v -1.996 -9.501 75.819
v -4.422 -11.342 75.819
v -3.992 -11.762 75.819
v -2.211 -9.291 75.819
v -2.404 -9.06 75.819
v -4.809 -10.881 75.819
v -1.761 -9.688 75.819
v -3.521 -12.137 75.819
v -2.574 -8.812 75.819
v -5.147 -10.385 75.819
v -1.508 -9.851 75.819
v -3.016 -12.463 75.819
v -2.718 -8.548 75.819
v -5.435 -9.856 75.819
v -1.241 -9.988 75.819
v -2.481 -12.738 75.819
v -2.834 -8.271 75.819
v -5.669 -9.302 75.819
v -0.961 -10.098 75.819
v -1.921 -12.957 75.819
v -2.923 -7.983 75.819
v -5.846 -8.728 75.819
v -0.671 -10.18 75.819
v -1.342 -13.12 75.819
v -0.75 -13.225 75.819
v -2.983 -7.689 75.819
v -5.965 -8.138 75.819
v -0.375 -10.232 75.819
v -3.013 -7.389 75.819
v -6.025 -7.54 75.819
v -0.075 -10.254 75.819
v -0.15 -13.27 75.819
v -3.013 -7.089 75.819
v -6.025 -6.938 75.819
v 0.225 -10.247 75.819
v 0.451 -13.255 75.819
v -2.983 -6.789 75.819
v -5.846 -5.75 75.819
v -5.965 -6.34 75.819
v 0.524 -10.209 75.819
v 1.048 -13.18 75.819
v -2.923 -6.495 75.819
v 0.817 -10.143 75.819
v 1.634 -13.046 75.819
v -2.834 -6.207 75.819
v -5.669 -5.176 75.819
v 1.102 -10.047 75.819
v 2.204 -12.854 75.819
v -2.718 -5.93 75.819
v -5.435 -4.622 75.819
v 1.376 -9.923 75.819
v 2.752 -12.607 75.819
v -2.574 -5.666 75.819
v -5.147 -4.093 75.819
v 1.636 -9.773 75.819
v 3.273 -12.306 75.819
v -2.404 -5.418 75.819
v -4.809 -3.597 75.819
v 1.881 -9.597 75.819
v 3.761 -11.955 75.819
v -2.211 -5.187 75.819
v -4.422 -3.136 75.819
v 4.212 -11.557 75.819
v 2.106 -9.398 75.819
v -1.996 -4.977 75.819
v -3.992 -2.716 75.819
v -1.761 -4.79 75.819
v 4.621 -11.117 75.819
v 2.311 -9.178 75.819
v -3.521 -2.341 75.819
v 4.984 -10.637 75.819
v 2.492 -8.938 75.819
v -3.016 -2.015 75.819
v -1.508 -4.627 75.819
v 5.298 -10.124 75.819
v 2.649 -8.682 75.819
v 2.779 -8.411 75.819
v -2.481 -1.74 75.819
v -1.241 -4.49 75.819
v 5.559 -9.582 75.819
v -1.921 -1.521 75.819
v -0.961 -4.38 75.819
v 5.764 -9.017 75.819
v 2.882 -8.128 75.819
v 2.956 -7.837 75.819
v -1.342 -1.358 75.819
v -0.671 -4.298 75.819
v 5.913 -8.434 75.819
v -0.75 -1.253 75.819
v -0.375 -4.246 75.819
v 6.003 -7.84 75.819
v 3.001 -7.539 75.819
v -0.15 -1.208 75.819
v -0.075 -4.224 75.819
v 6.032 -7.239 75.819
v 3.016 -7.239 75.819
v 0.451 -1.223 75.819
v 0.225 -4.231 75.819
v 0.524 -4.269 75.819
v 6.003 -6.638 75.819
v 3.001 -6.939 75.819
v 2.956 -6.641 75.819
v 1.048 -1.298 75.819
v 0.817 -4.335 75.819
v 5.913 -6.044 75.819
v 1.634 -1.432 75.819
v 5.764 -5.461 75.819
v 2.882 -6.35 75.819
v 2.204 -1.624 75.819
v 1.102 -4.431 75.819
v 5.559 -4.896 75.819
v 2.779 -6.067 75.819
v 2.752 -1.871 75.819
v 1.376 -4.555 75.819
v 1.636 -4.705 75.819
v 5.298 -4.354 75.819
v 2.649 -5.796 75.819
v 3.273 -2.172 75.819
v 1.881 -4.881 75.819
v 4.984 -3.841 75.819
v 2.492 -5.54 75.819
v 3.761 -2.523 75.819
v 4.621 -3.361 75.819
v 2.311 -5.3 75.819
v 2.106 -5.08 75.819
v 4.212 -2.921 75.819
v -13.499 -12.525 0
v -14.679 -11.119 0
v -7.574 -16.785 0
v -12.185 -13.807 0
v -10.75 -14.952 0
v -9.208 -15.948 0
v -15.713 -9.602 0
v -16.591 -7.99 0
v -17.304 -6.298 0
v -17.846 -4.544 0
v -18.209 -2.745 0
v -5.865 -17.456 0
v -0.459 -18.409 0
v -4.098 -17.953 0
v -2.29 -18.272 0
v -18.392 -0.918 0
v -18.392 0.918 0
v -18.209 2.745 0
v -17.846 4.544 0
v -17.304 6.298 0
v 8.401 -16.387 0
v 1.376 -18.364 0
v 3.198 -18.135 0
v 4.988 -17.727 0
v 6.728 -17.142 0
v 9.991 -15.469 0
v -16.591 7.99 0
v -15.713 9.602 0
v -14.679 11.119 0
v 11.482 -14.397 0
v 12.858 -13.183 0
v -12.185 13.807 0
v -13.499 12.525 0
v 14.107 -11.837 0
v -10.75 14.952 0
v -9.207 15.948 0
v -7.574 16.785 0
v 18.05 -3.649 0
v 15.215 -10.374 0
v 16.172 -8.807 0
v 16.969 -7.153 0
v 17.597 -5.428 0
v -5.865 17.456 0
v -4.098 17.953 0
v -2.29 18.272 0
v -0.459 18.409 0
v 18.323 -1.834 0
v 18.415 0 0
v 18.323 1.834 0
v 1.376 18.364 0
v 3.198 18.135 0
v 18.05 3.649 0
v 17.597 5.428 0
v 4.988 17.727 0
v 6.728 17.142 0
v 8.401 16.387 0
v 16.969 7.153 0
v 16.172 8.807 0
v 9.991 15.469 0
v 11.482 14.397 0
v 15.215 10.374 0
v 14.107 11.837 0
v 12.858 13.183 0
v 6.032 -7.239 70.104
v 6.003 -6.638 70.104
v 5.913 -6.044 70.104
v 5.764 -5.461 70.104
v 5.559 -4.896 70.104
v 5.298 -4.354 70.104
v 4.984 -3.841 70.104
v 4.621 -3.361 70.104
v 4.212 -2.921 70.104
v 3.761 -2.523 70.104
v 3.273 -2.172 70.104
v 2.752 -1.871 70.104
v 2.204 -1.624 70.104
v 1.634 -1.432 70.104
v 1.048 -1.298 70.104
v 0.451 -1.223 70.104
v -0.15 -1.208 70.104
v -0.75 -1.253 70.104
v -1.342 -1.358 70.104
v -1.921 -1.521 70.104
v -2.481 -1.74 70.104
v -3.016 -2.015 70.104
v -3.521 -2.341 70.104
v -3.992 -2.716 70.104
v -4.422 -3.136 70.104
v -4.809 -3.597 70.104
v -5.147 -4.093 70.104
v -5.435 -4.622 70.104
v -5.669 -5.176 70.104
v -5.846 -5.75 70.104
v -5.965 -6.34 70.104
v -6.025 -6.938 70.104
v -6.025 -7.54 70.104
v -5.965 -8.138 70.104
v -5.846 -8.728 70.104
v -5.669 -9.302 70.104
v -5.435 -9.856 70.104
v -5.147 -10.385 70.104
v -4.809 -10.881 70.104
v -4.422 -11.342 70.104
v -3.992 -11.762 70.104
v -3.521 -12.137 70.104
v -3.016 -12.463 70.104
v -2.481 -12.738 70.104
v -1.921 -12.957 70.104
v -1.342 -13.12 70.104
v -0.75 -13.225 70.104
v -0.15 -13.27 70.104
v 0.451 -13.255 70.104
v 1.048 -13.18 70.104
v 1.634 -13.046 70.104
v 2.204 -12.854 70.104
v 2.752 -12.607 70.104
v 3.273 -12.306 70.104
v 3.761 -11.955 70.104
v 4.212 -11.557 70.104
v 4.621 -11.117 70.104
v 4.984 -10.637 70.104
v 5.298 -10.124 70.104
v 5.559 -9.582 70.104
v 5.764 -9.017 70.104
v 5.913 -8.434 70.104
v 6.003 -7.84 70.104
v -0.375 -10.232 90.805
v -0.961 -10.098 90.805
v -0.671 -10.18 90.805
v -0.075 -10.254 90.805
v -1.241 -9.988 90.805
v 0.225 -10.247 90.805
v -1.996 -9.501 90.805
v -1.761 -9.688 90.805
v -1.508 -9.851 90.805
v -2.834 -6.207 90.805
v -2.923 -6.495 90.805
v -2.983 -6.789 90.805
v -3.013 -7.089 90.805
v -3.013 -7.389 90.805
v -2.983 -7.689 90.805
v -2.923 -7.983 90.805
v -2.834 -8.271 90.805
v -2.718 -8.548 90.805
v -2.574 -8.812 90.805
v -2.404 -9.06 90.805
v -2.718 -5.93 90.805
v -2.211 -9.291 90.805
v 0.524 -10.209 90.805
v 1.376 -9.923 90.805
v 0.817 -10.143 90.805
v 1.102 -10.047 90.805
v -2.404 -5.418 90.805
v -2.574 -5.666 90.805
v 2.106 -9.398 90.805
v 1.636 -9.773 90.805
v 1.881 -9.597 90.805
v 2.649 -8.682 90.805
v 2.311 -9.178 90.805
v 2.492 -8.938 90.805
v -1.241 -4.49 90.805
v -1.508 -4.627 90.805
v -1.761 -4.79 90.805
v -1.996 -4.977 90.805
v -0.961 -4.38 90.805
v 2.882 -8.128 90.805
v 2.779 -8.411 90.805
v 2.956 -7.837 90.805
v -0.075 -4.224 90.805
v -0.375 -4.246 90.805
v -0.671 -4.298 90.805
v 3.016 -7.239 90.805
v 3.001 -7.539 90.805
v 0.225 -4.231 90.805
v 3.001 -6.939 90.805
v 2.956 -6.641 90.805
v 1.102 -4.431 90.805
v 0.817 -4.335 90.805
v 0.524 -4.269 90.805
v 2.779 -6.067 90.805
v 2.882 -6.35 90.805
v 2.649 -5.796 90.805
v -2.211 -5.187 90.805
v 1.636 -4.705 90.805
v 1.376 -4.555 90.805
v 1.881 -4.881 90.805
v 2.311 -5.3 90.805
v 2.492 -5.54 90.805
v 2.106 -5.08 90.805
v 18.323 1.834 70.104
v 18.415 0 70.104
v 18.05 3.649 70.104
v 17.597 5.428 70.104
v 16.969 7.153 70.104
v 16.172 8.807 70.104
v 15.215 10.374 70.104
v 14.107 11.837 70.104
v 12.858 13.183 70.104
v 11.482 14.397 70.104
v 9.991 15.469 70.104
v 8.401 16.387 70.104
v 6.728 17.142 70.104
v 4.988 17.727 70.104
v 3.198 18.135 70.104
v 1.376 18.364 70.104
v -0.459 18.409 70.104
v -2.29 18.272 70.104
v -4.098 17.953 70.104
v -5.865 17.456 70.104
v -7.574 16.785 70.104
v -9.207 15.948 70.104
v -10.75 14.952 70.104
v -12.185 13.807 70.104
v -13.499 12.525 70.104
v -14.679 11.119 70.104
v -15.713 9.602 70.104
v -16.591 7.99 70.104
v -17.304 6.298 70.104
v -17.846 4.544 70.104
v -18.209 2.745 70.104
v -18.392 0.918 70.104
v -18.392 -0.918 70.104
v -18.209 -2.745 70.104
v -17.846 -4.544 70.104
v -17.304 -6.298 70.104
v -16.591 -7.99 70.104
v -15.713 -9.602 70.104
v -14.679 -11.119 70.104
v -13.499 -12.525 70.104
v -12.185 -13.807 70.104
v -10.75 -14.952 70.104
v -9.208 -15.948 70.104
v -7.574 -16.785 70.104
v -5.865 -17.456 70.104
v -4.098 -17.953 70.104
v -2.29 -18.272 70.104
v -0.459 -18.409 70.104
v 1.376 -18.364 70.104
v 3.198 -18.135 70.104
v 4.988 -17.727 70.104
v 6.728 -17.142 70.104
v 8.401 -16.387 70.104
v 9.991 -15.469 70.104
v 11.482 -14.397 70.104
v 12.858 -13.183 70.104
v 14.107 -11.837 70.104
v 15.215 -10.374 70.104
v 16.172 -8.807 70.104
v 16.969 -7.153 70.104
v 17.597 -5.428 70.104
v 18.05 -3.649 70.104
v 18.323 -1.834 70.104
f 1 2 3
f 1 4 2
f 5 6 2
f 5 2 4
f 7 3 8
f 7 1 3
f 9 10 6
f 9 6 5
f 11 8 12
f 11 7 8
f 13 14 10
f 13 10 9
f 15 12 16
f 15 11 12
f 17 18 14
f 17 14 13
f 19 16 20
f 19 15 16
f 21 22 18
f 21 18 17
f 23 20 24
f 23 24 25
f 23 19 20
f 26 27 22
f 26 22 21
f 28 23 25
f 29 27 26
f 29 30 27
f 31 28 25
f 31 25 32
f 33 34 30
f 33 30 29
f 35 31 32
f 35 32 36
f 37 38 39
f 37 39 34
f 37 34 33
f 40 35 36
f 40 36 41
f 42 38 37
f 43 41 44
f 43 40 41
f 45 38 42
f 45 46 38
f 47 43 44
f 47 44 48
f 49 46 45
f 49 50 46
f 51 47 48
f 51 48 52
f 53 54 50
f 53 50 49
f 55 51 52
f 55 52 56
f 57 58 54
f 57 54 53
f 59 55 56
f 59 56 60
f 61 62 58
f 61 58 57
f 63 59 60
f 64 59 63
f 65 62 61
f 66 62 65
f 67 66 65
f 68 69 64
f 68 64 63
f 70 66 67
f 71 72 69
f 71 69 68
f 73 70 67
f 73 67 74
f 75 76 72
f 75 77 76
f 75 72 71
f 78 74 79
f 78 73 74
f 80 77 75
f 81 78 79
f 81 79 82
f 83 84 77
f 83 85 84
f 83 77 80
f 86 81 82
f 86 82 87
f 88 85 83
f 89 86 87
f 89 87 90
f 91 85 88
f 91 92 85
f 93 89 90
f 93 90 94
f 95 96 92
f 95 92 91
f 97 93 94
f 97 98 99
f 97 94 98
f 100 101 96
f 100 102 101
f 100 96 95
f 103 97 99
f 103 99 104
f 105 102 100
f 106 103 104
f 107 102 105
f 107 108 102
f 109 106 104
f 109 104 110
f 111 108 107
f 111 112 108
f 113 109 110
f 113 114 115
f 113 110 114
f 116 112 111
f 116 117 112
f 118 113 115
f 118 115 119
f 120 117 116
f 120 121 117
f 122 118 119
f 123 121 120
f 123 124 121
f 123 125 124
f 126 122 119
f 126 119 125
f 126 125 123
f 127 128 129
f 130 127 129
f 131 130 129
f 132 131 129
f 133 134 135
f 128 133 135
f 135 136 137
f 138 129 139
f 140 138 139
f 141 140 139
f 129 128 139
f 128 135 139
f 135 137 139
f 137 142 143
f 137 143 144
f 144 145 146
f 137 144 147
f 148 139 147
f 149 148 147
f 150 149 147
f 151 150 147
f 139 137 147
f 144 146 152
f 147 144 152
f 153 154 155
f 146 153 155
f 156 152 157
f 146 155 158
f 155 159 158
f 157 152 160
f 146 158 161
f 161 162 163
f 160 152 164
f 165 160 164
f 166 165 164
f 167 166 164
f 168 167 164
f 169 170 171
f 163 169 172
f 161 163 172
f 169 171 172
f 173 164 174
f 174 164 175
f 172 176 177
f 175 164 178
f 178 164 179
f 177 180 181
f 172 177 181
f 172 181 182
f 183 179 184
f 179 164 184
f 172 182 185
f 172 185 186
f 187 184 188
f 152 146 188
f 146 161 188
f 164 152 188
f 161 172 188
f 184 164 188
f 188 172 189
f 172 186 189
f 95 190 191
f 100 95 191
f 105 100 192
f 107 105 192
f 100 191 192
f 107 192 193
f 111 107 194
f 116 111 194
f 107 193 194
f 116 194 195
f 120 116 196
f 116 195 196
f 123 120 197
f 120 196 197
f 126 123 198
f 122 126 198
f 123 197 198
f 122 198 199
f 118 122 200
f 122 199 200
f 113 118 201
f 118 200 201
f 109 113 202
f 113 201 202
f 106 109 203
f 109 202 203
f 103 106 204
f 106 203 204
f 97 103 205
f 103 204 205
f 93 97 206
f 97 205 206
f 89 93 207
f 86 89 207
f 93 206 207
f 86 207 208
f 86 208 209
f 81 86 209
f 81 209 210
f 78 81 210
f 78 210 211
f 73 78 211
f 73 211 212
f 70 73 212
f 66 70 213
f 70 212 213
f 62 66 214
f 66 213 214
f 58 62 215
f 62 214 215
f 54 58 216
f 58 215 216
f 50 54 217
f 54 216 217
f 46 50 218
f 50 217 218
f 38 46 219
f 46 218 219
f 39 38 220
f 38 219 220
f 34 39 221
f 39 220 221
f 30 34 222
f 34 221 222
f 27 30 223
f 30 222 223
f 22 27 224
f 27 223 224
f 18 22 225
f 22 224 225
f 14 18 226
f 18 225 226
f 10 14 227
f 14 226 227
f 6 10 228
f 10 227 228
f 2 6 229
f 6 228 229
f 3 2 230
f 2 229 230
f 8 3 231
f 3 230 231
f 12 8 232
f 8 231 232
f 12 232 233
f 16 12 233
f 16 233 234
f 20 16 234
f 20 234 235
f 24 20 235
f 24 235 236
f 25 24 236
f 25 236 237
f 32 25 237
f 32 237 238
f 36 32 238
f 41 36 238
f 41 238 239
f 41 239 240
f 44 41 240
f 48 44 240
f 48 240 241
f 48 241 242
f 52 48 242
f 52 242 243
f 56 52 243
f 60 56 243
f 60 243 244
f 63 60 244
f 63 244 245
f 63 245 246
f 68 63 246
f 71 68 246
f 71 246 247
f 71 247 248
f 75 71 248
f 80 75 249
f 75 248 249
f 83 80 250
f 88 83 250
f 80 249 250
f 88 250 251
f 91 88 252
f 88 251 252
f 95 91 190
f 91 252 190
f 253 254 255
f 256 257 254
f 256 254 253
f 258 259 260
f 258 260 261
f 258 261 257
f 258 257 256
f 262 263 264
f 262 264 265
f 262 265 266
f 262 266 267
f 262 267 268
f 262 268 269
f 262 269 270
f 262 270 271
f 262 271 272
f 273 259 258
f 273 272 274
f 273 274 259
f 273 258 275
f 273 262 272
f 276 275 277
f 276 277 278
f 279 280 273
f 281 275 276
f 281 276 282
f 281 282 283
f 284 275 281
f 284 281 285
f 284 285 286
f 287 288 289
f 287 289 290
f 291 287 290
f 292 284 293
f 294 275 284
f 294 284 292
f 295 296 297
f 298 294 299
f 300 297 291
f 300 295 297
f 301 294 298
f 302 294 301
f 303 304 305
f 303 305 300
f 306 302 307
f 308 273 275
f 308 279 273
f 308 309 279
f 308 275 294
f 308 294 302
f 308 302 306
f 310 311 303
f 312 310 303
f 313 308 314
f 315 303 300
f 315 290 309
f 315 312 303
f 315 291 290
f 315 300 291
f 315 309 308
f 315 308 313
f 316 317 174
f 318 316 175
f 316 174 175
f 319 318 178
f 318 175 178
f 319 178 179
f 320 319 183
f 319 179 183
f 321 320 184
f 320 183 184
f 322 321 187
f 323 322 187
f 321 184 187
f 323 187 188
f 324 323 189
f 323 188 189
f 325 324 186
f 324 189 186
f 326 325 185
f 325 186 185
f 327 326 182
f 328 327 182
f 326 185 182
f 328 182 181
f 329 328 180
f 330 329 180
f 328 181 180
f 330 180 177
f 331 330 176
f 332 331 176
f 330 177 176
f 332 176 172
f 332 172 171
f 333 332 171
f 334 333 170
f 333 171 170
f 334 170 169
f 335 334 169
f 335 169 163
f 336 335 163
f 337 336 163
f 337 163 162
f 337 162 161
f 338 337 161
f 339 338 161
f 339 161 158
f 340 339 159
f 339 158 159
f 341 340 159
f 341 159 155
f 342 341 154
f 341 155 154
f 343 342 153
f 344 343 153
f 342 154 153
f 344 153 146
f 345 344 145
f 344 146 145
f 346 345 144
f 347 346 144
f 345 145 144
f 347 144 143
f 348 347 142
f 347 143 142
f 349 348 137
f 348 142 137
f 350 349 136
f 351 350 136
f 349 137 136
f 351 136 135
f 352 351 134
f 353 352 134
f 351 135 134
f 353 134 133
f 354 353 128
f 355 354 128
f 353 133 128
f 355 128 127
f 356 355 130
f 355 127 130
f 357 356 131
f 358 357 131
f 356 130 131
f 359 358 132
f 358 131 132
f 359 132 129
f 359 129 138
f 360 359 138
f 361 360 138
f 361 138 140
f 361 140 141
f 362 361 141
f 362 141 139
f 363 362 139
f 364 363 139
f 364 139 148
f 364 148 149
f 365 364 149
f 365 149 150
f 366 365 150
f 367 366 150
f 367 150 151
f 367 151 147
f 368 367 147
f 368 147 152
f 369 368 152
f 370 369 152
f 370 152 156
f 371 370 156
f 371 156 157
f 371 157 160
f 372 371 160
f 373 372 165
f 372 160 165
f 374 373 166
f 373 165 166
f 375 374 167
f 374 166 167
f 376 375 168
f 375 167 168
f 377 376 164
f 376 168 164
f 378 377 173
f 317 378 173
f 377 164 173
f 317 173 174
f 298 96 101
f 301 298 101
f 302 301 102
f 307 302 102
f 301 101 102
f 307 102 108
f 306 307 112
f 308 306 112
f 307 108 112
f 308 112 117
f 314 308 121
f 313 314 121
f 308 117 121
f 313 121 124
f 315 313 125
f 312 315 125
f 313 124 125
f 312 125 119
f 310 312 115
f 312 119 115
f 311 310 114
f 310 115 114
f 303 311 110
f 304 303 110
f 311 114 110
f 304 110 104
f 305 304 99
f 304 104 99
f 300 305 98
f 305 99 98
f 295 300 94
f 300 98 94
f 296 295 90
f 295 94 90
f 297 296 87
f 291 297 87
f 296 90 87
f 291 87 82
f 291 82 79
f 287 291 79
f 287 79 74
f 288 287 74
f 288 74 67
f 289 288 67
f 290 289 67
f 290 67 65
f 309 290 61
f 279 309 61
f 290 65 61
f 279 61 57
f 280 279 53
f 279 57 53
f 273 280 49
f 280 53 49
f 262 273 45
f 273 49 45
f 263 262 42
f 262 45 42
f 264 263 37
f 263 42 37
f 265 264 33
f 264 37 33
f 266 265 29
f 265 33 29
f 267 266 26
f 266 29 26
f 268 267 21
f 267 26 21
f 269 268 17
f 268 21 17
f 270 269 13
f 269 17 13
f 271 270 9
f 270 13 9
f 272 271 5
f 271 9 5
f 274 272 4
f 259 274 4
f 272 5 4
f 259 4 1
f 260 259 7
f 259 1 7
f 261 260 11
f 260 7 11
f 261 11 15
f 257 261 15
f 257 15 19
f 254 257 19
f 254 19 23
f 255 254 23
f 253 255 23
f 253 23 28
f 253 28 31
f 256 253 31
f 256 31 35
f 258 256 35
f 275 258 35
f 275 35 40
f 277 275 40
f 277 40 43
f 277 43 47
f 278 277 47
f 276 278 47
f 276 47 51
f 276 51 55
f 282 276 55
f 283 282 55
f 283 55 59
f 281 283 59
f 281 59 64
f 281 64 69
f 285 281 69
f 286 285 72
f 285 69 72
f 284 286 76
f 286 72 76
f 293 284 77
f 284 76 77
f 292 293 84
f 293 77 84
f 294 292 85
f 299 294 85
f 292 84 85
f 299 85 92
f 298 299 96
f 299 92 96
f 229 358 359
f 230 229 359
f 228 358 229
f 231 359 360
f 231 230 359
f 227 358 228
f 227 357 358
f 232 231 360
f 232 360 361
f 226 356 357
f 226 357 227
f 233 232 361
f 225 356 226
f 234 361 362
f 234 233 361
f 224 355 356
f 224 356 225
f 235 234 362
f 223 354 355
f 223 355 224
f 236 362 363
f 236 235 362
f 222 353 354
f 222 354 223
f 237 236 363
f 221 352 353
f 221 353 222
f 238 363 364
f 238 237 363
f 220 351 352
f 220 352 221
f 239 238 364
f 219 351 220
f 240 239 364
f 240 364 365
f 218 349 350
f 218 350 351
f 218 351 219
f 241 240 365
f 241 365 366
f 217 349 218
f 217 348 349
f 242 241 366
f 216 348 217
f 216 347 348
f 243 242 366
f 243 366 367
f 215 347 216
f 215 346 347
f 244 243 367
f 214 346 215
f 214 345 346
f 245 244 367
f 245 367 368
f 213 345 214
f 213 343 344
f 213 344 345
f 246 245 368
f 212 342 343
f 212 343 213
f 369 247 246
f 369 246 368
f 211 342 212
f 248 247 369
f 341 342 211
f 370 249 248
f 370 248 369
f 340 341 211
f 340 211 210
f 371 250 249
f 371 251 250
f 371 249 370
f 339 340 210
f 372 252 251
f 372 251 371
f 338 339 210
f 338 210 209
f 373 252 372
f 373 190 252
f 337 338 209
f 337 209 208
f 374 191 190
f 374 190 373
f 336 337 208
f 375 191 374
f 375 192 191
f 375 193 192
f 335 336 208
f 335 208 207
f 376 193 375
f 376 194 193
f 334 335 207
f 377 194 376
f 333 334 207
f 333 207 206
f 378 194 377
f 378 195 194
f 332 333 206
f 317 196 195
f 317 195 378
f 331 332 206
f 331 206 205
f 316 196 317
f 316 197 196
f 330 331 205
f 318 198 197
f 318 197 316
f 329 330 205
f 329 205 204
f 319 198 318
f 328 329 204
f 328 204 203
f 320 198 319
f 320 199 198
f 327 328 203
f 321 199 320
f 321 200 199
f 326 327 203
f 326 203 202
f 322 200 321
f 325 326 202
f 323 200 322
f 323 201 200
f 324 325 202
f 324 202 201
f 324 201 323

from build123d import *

# Parameters (mm, degrees)
SKETCH2_R           = 18.415
BOSS_EXTRUDE1_DEPTH = 70.104
SKETCH3_R           = 6.0325
BOSS_EXTRUDE2_DEPTH = 5.715
SKETCH5_R           = 3.01625
BOSS_EXTRUDE3_DEPTH = 14.986


with BuildPart() as part:
    # Sketch2 → Boss-Extrude1 (new body)
    with BuildSketch(Plane.XY):
        Circle(SKETCH2_R)
    extrude(amount=BOSS_EXTRUDE1_DEPTH)

    # Sketch3 → Boss-Extrude2 (add)
    with BuildSketch(Plane.XY.offset(70.104)):
        with Locations((0, -7.239)):
            Circle(SKETCH3_R)
    extrude(amount=BOSS_EXTRUDE2_DEPTH)

    # Sketch5 → Boss-Extrude3 (add)
    with BuildSketch(Plane.XY.offset(75.819)):
        with Locations((0, -7.239)):
            Circle(SKETCH5_R)
    extrude(amount=BOSS_EXTRUDE3_DEPTH)


solid = part.part
